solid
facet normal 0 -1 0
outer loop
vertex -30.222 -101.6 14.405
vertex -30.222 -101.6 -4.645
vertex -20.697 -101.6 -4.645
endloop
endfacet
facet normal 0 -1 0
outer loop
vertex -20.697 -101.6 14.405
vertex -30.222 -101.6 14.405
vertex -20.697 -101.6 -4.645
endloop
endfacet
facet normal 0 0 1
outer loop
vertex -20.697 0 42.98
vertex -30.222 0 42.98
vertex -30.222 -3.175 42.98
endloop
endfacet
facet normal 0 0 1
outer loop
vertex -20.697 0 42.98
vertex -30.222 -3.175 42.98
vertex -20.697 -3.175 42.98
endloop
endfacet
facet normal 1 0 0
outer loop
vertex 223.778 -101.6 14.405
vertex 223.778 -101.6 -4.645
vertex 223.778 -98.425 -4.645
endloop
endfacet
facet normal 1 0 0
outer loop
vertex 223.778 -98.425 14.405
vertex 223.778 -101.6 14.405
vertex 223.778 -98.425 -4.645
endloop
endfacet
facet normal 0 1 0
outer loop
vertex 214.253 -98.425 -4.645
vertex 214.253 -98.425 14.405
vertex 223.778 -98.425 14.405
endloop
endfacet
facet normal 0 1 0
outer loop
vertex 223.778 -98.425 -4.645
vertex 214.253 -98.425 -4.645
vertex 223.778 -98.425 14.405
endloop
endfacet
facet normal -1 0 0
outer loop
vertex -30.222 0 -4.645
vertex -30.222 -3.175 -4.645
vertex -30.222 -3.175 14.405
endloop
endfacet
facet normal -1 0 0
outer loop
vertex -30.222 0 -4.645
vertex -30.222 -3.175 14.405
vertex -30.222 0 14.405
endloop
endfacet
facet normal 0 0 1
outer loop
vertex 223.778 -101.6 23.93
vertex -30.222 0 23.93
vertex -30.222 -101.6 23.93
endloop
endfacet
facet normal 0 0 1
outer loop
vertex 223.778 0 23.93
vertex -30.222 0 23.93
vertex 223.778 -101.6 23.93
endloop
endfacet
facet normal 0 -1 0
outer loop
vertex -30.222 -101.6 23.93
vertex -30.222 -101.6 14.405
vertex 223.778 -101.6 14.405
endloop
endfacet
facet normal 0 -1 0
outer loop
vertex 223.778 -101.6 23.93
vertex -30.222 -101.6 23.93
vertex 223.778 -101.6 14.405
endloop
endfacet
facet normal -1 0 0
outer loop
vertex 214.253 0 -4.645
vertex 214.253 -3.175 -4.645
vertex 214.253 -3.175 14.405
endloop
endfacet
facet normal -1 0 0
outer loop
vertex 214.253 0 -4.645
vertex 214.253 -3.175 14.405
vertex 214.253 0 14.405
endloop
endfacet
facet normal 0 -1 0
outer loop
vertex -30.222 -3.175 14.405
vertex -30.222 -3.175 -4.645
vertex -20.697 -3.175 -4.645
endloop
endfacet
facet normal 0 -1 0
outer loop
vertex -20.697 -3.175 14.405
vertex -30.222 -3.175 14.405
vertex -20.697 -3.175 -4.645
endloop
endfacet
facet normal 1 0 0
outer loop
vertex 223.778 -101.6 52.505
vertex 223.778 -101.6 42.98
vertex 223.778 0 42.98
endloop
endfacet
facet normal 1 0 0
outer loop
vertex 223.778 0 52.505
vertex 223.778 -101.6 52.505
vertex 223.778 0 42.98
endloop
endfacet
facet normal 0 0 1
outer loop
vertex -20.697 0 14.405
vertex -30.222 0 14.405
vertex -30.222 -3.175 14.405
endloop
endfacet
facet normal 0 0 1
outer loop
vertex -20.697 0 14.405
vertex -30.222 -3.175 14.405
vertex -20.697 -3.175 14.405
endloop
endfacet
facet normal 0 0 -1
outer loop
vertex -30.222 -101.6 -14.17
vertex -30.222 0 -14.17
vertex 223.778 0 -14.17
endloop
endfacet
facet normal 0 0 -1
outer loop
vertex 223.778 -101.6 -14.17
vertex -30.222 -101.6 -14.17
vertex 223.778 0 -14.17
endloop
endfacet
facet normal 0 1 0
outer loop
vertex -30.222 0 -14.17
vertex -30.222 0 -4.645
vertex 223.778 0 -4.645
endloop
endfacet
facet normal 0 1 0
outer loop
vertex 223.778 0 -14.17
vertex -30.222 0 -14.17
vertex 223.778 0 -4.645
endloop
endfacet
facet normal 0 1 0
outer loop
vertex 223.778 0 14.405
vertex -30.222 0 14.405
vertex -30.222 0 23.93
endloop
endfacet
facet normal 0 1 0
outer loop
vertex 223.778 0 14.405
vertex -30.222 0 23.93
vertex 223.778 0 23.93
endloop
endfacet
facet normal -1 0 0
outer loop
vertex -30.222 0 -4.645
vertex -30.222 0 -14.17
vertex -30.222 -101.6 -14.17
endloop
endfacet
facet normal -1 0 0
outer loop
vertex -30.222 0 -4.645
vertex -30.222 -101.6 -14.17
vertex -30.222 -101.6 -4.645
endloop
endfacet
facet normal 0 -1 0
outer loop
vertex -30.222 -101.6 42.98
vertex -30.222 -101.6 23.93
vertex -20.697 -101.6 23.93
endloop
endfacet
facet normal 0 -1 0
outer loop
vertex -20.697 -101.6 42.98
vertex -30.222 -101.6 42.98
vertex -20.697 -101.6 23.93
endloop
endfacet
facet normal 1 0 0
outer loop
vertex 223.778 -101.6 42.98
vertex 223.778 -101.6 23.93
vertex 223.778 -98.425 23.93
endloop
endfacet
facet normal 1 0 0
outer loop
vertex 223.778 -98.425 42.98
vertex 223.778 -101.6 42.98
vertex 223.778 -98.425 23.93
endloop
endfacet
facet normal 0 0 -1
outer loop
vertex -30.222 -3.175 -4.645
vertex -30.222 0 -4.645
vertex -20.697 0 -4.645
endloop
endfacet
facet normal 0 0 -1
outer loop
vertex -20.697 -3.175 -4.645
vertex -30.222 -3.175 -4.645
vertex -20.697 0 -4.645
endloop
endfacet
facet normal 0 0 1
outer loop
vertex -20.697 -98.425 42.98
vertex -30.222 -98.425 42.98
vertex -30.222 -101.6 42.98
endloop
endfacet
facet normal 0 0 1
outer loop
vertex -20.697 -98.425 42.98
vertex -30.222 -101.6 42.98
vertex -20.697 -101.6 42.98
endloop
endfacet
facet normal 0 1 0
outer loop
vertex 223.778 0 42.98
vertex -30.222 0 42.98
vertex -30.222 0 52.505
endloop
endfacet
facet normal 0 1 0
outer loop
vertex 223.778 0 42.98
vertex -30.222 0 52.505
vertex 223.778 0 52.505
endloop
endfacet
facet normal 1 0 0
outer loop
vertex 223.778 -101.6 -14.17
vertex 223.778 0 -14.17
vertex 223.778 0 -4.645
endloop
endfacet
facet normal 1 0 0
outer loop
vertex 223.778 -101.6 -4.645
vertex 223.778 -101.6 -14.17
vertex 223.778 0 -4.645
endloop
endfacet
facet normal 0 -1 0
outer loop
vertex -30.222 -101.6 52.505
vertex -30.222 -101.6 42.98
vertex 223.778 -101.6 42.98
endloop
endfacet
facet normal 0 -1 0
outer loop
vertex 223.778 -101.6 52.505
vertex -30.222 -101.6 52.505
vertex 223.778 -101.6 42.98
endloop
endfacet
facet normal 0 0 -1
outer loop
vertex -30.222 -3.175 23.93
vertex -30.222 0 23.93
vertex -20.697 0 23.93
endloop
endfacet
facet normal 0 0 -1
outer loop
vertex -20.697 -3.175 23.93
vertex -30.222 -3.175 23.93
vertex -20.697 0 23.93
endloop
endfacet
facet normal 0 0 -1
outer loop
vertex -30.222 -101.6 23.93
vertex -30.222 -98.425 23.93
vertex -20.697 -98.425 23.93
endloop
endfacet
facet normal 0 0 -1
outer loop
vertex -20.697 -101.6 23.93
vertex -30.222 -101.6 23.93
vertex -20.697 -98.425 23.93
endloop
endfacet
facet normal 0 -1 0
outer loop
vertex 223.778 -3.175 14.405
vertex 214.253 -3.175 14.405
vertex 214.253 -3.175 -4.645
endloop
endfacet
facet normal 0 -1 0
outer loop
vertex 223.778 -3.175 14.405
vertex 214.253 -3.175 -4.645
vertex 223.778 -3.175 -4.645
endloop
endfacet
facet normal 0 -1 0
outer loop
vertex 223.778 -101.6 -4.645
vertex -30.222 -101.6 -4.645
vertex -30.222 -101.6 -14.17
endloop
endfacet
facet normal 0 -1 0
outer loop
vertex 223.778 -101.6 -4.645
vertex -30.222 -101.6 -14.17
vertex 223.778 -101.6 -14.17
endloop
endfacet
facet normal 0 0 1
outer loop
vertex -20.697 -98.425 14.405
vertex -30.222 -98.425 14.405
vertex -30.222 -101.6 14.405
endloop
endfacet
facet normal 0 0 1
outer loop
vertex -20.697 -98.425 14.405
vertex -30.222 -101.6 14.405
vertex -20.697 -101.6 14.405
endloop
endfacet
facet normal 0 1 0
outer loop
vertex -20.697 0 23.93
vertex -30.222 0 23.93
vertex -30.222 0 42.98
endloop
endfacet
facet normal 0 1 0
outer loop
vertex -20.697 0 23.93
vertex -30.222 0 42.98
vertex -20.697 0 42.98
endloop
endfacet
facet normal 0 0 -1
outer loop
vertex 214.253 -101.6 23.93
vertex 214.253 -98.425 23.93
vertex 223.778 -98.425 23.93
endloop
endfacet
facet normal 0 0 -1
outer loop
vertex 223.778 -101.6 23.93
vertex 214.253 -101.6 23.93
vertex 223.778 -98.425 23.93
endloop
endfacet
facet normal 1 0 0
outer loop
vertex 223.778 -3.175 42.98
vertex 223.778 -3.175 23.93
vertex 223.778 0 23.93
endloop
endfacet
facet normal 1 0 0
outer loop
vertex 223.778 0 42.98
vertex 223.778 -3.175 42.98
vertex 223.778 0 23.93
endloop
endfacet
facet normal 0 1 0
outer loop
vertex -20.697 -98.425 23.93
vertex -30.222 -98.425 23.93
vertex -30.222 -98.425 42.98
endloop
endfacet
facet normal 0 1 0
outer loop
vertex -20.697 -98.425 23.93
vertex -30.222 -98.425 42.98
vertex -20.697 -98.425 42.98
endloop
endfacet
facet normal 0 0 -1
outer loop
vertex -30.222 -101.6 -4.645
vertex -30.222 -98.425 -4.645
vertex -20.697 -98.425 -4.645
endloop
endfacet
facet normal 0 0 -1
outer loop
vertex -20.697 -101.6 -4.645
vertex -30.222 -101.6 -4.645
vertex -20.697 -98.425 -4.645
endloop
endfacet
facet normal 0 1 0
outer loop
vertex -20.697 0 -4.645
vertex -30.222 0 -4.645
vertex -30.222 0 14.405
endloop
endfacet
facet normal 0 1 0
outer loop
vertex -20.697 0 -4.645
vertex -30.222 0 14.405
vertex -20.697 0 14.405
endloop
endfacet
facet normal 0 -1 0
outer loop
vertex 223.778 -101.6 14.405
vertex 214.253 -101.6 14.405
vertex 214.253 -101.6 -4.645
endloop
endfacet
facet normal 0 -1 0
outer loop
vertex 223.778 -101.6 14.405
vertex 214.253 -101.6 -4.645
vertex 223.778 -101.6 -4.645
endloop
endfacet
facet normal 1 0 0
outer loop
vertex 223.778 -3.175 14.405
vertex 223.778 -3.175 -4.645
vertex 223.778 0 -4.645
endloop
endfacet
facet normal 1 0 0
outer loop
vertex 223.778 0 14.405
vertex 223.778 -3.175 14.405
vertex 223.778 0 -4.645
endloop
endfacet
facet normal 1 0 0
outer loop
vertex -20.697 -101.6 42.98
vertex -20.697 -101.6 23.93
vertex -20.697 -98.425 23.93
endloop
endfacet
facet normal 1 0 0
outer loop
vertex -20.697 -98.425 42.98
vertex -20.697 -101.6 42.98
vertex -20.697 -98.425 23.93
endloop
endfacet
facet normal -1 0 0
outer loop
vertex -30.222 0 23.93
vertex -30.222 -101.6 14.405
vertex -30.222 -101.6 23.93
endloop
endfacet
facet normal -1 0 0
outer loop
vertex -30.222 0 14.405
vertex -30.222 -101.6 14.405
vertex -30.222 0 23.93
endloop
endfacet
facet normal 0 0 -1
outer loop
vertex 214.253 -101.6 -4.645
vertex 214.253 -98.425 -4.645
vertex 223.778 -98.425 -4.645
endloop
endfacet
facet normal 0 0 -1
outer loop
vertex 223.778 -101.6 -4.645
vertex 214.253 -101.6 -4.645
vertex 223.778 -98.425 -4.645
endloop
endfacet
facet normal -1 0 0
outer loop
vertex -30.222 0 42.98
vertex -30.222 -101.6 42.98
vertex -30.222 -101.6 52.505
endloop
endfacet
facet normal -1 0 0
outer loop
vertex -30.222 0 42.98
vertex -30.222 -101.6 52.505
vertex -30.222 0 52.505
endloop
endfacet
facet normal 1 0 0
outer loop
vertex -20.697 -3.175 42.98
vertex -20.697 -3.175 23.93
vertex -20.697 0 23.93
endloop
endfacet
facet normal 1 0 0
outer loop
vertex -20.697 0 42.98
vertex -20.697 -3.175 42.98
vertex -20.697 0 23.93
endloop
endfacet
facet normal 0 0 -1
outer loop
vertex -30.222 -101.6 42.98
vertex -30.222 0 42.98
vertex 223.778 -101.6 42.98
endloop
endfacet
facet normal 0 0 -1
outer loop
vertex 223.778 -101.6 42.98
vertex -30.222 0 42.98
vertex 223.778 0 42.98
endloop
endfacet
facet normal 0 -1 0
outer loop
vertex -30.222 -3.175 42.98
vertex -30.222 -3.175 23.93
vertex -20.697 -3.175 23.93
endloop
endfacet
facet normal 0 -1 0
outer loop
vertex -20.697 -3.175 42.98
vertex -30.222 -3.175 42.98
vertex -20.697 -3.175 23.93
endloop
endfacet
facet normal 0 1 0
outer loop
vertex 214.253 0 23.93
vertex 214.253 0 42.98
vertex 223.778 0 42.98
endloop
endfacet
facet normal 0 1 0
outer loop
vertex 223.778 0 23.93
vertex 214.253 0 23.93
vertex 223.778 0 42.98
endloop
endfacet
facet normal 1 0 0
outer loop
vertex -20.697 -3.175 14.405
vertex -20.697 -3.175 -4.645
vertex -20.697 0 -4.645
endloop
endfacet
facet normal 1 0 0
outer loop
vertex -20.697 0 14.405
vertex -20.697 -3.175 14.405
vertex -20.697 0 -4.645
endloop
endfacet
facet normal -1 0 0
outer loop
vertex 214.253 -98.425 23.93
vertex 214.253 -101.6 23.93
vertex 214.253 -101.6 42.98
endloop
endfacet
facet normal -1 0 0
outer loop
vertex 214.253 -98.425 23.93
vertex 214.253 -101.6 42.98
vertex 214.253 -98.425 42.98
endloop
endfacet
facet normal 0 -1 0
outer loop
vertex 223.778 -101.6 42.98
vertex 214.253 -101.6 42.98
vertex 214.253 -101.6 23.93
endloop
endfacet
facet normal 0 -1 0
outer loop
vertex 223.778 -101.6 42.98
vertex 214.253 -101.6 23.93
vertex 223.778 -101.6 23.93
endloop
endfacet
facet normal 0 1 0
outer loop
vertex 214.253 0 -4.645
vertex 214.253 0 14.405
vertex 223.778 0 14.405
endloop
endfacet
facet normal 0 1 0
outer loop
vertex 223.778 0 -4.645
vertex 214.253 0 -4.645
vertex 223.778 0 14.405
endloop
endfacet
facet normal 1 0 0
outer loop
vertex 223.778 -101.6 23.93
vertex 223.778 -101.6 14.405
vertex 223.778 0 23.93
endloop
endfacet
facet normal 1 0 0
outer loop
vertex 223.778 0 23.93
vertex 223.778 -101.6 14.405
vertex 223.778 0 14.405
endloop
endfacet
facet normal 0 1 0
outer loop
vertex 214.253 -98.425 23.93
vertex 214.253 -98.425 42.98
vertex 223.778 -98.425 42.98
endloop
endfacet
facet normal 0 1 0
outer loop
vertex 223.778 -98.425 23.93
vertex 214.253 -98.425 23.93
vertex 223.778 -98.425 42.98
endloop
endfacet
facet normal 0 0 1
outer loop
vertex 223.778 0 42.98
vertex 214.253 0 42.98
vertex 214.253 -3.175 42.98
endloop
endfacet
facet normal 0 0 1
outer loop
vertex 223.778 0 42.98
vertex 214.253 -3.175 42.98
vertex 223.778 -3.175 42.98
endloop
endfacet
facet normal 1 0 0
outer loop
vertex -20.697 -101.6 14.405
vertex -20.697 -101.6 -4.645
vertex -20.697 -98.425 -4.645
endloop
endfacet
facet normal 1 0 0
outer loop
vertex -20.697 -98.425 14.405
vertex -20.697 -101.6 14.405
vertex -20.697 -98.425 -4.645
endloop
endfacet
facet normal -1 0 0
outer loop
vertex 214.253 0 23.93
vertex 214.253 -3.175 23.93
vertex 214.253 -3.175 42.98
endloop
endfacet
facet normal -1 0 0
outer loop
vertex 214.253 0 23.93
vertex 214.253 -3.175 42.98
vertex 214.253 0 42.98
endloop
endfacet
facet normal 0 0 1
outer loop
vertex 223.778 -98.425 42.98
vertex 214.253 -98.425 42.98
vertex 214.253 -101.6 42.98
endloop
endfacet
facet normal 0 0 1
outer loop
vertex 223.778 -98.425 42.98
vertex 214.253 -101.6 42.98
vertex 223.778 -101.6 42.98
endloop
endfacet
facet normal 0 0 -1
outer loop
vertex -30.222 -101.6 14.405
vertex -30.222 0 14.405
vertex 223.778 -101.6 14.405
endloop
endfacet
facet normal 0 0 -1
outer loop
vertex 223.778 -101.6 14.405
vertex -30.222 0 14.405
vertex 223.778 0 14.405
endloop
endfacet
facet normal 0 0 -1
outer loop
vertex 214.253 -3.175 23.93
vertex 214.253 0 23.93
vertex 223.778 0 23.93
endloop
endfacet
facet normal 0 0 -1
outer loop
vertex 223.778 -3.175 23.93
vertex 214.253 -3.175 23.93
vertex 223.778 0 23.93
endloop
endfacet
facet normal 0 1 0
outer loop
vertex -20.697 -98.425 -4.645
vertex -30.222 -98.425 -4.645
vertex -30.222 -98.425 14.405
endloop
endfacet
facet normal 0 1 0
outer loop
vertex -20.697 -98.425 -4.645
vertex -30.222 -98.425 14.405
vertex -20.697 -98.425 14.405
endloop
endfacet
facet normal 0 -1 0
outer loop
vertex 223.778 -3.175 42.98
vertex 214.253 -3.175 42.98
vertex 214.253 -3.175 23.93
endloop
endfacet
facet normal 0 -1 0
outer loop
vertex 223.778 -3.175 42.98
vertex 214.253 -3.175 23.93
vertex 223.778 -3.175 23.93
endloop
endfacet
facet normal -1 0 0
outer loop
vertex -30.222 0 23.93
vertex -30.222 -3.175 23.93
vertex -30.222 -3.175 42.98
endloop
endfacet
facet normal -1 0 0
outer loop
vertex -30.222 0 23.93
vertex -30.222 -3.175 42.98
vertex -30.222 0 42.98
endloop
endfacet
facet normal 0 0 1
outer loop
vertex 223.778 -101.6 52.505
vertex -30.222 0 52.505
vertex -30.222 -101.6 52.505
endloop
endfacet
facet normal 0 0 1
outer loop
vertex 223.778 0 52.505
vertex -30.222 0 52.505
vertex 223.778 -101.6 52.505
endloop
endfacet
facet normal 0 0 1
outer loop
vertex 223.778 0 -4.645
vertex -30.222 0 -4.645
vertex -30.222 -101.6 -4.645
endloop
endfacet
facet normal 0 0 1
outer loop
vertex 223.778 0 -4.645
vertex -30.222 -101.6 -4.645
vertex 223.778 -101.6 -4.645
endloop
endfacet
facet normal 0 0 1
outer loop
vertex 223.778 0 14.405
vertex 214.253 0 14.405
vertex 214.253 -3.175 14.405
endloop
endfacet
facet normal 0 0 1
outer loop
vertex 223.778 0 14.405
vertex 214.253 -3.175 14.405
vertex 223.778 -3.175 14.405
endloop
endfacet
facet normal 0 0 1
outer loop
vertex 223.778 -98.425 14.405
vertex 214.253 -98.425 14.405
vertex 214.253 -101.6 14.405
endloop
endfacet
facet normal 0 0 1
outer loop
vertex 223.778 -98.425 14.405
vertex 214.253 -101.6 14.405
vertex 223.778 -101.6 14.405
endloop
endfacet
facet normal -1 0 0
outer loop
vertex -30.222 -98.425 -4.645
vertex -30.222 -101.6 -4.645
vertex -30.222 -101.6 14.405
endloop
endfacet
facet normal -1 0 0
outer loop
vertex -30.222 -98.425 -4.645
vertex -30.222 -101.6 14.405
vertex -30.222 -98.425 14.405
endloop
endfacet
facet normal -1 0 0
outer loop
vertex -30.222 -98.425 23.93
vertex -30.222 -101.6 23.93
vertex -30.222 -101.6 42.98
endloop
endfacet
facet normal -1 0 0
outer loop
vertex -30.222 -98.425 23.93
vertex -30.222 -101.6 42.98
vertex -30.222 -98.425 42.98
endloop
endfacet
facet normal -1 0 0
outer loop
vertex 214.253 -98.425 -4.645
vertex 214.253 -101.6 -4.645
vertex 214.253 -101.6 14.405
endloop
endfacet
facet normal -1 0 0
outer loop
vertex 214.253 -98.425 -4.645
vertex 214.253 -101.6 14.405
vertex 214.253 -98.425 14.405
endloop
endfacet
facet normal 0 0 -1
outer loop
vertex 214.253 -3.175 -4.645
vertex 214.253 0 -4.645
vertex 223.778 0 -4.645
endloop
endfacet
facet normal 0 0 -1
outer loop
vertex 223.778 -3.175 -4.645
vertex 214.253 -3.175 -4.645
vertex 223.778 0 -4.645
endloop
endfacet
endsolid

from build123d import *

# Parameters (mm, degrees)
F0_W     = 254
F0_H     = 9.525
F1_DEPTH = 101.6
F2_W     = 9.525
F2_H     = 3.175
F3_DEPTH = 19.05
F4_W     = 254
F4_H     = 101.6
F5_DEPTH = 9.525
F6_W     = 9.525
F6_H     = 3.175
F7_DEPTH = 19.05
F8_W     = 254
F8_H     = 101.6
F9_DEPTH = 9.525


with BuildPart() as f1:
    # F0 (on Front) → F1 (new body)
    with BuildSketch(Plane.XZ):
        with Locations((96.778256, -9.407066)):
            Rectangle(F0_W, F0_H)
    extrude(amount=F1_DEPTH)


with BuildPart() as f3:
    # F2 (on face) → F3 (new body)
    with BuildSketch(Plane.XY.offset(23.930434)):
        with Locations((219.015756, -100.0125)):
            Rectangle(F2_W, F2_H)
        with Locations((219.015756, -1.5875)):
            Rectangle(F2_W, F2_H)
        with Locations((-25.459244, -100.0125)):
            Rectangle(F2_W, F2_H)
        with Locations((-25.459244, -1.5875)):
            Rectangle(F2_W, F2_H)
    extrude(amount=F3_DEPTH)


with BuildPart() as f5:
    # F4 (on face) → F5 (new body)
    with BuildSketch(Plane.XY.offset(14.405434)):
        with Locations((96.778256, -50.8)):
            Rectangle(F4_W, F4_H)
    extrude(amount=F5_DEPTH)


with BuildPart() as f7:
    # F6 (on face) → F7 (new body)
    with BuildSketch(Plane.XY.offset(-4.644566)):
        with Locations((-25.459244, -1.5875)):
            Rectangle(F6_W, F6_H)
        with Locations((219.015756, -1.5875)):
            Rectangle(F6_W, F6_H)
        with Locations((219.015756, -100.0125)):
            Rectangle(F6_W, F6_H)
        with Locations((-25.459244, -100.0125)):
            Rectangle(F6_W, F6_H)
    extrude(amount=F7_DEPTH)


with BuildPart() as f9:
    # F8 (on face) → F9 (new body)
    with BuildSketch(Plane.XY.offset(42.980434)):
        with Locations((96.778256, -50.8)):
            Rectangle(F8_W, F8_H)
    extrude(amount=F9_DEPTH)


solid = Compound([f1.part, f3.part, f5.part, f7.part, f9.part])
